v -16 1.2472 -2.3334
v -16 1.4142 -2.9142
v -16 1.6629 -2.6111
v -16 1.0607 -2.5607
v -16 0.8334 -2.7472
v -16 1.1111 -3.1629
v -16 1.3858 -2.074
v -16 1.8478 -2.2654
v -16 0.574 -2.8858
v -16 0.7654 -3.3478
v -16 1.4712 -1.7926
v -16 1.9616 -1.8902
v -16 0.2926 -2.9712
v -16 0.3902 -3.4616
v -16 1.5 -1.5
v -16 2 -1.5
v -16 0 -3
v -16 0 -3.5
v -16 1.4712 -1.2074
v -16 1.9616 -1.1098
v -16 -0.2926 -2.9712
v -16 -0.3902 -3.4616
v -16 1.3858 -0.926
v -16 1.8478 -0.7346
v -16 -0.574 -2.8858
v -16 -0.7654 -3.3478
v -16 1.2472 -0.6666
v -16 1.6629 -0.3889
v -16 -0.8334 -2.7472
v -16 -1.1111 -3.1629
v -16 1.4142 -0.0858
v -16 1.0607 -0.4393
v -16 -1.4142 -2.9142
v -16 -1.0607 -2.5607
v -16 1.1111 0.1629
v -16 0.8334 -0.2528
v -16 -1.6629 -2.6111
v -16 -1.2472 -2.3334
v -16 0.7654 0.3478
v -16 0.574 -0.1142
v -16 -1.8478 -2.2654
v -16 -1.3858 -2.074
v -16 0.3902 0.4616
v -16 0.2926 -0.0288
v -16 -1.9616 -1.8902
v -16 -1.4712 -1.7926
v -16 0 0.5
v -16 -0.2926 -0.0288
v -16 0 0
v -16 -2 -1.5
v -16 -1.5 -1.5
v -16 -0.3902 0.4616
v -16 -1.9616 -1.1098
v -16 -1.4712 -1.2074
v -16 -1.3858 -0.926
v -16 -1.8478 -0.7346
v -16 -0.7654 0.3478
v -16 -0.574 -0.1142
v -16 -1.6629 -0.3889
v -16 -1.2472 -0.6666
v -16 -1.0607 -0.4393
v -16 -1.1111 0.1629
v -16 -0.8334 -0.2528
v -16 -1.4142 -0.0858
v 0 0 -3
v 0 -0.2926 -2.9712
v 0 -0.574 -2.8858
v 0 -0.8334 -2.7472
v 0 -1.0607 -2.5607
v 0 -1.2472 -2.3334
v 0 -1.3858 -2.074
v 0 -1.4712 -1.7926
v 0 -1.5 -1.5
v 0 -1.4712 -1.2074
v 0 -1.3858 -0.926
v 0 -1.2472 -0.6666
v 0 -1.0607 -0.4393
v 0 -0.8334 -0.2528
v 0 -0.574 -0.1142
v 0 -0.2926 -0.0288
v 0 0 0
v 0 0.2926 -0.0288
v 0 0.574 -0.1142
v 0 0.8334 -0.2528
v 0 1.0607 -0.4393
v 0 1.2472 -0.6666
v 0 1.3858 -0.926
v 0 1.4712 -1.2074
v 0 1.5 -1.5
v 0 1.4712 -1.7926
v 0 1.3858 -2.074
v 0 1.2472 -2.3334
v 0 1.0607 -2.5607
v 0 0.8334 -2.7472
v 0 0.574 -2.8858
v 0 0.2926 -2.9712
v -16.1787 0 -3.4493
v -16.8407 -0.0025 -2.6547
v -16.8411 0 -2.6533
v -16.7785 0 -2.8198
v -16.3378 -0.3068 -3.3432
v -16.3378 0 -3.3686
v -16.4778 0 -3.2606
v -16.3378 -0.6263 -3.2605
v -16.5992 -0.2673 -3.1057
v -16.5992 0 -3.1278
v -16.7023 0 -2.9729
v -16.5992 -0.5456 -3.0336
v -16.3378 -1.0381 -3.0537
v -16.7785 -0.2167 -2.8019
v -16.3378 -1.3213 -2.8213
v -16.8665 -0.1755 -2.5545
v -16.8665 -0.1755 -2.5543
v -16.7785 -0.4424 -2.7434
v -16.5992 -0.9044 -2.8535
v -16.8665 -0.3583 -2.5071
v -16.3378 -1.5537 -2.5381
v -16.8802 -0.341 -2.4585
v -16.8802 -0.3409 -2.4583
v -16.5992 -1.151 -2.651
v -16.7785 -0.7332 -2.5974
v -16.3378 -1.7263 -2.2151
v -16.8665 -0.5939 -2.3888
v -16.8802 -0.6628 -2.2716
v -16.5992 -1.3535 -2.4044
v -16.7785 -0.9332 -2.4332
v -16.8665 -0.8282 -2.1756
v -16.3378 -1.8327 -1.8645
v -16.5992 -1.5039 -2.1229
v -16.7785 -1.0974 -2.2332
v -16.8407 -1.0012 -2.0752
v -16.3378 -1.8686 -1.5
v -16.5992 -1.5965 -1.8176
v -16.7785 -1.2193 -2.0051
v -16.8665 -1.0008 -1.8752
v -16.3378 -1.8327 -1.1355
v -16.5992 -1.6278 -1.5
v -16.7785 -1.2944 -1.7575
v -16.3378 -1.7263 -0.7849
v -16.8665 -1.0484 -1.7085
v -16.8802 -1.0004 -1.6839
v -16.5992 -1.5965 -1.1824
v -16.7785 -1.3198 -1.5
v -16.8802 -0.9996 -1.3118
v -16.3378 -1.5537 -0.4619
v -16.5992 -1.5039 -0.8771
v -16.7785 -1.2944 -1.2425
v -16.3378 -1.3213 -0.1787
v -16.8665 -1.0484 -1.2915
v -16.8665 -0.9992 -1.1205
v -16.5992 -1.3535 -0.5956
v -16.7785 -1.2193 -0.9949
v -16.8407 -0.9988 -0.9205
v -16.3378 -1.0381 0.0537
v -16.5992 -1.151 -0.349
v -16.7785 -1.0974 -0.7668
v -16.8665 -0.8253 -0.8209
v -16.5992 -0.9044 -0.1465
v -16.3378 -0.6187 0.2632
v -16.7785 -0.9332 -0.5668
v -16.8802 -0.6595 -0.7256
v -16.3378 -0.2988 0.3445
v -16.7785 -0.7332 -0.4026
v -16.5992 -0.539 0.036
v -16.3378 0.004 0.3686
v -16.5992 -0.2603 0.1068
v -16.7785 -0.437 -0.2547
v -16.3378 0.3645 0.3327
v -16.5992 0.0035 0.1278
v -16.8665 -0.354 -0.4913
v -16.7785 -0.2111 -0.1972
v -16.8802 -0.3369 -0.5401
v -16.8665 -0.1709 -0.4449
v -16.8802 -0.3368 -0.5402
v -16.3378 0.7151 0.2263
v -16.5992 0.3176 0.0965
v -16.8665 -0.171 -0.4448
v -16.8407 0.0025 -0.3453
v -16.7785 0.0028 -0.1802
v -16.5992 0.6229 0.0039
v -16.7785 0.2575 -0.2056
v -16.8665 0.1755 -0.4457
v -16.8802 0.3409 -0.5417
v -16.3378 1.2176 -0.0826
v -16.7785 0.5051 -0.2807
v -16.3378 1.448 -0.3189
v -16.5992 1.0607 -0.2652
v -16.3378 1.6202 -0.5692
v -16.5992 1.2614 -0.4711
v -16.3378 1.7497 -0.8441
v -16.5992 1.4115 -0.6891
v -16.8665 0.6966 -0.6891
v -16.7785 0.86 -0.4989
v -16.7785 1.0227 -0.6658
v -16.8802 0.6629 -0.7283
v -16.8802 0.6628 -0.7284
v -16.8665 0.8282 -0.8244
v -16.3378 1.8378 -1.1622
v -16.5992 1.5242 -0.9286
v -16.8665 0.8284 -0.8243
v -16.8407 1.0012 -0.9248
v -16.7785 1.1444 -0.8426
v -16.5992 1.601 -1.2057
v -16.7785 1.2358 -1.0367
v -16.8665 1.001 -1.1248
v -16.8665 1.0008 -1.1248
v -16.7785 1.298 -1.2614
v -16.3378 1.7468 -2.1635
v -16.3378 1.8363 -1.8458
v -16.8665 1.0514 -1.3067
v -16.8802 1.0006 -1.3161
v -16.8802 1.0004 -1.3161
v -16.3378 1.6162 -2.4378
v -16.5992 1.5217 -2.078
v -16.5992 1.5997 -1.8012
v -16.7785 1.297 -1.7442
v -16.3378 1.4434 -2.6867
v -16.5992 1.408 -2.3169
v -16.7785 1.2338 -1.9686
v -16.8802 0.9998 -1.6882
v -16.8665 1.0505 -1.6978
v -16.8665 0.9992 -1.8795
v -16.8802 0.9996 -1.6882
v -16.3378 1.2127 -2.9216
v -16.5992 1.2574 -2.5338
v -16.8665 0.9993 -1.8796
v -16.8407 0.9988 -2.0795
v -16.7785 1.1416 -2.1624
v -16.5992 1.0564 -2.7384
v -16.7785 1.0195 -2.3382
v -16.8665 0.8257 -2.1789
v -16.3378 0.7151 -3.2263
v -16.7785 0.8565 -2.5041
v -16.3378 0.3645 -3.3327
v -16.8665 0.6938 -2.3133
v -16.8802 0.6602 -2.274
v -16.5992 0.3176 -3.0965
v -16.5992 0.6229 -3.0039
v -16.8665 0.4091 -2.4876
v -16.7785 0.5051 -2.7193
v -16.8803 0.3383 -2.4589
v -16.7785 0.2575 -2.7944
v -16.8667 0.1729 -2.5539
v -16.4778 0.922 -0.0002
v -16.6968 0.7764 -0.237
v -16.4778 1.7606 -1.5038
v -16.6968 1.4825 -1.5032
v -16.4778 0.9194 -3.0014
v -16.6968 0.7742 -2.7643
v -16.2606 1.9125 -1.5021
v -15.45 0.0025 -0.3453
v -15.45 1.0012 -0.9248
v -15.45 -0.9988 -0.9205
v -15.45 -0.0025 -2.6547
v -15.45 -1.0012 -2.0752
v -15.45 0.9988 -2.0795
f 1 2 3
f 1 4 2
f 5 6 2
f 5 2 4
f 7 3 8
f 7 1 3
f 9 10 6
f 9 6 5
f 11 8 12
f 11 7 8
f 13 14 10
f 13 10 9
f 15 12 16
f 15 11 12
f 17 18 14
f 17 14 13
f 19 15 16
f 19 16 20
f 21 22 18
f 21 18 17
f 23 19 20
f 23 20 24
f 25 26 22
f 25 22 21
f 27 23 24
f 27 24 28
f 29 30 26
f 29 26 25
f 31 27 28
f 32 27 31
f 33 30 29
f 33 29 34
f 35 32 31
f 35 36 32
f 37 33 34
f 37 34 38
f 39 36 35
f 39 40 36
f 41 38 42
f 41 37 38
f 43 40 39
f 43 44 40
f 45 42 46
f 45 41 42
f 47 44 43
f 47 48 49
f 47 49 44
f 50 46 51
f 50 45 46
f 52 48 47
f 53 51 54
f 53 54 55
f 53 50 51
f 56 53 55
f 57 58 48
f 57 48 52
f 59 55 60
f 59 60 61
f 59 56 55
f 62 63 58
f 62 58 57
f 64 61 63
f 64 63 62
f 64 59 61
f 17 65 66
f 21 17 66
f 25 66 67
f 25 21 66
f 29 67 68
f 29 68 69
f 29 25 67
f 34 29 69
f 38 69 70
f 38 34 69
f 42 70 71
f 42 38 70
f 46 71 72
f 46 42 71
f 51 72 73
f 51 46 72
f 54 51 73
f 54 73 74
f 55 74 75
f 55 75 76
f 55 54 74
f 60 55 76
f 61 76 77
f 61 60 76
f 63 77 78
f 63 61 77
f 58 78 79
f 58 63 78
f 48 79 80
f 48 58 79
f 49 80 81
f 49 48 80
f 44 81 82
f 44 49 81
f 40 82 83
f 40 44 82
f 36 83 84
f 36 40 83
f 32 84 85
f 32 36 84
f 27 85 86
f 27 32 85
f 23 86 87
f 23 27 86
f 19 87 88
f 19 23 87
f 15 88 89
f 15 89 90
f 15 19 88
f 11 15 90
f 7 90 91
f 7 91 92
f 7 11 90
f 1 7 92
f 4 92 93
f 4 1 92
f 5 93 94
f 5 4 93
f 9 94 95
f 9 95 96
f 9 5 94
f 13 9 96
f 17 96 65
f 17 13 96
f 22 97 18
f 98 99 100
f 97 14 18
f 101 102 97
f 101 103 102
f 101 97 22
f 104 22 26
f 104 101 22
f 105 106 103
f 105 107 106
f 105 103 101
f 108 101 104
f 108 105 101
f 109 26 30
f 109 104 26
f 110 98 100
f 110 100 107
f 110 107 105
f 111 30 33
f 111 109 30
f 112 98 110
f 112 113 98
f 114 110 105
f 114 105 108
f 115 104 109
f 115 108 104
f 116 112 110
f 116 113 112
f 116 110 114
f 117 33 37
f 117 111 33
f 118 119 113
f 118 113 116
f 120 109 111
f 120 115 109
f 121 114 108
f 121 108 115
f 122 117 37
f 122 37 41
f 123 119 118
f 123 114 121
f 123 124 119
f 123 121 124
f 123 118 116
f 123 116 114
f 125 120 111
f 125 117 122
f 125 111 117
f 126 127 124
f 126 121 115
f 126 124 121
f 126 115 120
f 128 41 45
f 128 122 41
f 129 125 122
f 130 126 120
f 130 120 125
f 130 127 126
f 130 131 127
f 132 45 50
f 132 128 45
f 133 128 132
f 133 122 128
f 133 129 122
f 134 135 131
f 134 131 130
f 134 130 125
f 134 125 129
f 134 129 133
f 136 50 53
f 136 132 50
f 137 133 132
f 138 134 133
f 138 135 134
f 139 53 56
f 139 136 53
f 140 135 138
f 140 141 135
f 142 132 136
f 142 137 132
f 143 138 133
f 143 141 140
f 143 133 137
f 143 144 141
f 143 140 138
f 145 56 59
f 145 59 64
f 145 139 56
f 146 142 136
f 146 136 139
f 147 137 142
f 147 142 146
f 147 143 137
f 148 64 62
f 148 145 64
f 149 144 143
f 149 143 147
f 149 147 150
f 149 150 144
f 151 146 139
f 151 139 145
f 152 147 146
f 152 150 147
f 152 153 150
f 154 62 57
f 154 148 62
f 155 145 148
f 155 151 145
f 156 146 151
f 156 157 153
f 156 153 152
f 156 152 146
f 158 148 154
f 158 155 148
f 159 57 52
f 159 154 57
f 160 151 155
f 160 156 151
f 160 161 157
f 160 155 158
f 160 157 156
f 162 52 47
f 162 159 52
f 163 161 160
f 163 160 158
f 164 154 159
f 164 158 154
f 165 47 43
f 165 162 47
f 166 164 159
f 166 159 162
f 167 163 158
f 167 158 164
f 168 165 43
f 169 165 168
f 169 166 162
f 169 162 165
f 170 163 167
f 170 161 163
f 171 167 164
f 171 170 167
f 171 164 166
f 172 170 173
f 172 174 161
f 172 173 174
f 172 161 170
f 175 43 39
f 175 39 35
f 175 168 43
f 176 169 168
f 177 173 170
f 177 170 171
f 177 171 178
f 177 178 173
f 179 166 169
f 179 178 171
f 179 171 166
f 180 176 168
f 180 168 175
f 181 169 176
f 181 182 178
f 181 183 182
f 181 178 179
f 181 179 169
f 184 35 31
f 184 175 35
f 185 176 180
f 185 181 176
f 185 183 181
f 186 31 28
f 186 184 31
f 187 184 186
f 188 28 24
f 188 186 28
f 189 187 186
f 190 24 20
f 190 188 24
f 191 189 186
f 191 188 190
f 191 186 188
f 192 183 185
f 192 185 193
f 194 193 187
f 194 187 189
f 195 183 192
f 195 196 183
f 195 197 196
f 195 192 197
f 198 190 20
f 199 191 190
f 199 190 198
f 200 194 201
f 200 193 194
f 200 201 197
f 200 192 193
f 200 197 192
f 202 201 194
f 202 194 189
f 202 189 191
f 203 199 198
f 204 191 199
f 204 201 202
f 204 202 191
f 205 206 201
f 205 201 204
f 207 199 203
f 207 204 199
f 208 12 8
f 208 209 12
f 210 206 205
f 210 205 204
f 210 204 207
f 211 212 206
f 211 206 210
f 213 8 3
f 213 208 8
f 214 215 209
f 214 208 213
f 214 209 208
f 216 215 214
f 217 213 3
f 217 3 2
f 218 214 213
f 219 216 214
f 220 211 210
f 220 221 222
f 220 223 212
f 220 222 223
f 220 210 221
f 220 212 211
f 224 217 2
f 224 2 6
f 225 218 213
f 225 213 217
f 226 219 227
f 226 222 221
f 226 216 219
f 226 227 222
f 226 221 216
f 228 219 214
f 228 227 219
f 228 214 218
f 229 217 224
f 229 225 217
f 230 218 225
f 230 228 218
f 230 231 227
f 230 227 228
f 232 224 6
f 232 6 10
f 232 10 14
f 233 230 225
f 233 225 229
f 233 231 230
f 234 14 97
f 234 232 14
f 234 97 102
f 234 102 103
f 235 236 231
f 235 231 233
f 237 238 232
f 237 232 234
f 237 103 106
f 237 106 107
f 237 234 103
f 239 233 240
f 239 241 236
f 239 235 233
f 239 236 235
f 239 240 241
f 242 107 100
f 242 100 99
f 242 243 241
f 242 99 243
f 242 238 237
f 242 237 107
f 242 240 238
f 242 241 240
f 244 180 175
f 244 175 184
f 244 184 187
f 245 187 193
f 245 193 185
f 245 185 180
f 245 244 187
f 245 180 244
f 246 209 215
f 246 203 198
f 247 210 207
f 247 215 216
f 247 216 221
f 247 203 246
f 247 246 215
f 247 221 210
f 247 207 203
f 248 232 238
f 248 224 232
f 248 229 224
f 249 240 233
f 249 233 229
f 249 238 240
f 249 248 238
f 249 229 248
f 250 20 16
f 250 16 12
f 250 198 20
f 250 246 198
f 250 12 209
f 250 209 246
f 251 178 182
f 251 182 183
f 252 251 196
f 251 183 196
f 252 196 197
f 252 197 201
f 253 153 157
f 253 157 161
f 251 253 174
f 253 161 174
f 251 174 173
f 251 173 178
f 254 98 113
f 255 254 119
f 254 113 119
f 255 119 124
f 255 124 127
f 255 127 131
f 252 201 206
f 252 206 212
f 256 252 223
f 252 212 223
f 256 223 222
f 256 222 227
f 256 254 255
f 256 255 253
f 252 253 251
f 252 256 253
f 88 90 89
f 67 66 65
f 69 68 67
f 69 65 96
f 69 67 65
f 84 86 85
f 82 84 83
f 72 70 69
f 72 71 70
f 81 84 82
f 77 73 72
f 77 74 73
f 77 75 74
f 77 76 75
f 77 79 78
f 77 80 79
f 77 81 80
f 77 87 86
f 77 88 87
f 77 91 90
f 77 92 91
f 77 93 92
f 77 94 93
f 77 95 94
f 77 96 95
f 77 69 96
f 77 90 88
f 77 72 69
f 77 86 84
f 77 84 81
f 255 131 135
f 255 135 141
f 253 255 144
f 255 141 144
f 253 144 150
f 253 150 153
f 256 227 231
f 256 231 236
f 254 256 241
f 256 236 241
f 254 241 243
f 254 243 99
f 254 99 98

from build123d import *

# Parameters (mm, degrees)
SKETCH3_R          = 0.593950471
CUT_EXTRUDE1_DEPTH = 1.5
SKETCH4_R          = 0.593950471
CUT_EXTRUDE2_DEPTH = 1.5


with BuildPart() as part:
    # Sketch1 → Revolve1 (revolve)
    with BuildSketch(Plane(origin=(0, 0, 0), x_dir=(1, 0, 0), z_dir=(0, 1, 0)), mode=Mode.PRIVATE) as revolve1_sk:
        with BuildLine():
            add(Edge.make_bspline(
                [(-16, -0.5), (-16.59076322, -0.390621653), (-16.887881425, 0.197649901), (-16.95, 0.906049529)],
                knots=[0, 0, 0, 0, 0.787142654, 0.787142654, 0.787142654, 0.787142654], degree=3))
            Line((-16.95, 0.906049529), (-16.95, 1.5))
            Line((-16.95, 1.5), (0, 1.5))
            Line((0, 1.5), (0, 0))
            Line((0, 0), (-16, 0))
            Line((-16, 0), (-16, -0.5))
        make_face()
    revolve(revolve1_sk.sketch.rotate(Axis((0, 0, -1.5), (-1, 0, 0)), 180), axis=Axis((0, 0, -1.5), (-1, 0, 0)))

    # Sketch3 → Cut-Extrude1 (cut)
    with BuildSketch(Plane.ZY.offset(16.95)):
        Polygon((-0.924807923, 1.001242932), (-2.079505776, 0.998752416), (-2.654697853, -0.002490515), (-2.075192077, -1.001242932), (-0.920494224, -0.998752416), (-0.345302147, 0.002490515), align=None)
        with Locations((-1.5, 0)):
            Circle(SKETCH3_R, mode=Mode.SUBTRACT)
    extrude(amount=-CUT_EXTRUDE1_DEPTH, mode=Mode.SUBTRACT)

    # Sketch4 → Cut-Extrude2 (cut)
    with BuildSketch(Plane.ZY.offset(16.95)):
        with Locations((-1.5, 0)):
            Circle(SKETCH4_R)
    extrude(amount=-CUT_EXTRUDE2_DEPTH, mode=Mode.SUBTRACT)


solid = part.part
